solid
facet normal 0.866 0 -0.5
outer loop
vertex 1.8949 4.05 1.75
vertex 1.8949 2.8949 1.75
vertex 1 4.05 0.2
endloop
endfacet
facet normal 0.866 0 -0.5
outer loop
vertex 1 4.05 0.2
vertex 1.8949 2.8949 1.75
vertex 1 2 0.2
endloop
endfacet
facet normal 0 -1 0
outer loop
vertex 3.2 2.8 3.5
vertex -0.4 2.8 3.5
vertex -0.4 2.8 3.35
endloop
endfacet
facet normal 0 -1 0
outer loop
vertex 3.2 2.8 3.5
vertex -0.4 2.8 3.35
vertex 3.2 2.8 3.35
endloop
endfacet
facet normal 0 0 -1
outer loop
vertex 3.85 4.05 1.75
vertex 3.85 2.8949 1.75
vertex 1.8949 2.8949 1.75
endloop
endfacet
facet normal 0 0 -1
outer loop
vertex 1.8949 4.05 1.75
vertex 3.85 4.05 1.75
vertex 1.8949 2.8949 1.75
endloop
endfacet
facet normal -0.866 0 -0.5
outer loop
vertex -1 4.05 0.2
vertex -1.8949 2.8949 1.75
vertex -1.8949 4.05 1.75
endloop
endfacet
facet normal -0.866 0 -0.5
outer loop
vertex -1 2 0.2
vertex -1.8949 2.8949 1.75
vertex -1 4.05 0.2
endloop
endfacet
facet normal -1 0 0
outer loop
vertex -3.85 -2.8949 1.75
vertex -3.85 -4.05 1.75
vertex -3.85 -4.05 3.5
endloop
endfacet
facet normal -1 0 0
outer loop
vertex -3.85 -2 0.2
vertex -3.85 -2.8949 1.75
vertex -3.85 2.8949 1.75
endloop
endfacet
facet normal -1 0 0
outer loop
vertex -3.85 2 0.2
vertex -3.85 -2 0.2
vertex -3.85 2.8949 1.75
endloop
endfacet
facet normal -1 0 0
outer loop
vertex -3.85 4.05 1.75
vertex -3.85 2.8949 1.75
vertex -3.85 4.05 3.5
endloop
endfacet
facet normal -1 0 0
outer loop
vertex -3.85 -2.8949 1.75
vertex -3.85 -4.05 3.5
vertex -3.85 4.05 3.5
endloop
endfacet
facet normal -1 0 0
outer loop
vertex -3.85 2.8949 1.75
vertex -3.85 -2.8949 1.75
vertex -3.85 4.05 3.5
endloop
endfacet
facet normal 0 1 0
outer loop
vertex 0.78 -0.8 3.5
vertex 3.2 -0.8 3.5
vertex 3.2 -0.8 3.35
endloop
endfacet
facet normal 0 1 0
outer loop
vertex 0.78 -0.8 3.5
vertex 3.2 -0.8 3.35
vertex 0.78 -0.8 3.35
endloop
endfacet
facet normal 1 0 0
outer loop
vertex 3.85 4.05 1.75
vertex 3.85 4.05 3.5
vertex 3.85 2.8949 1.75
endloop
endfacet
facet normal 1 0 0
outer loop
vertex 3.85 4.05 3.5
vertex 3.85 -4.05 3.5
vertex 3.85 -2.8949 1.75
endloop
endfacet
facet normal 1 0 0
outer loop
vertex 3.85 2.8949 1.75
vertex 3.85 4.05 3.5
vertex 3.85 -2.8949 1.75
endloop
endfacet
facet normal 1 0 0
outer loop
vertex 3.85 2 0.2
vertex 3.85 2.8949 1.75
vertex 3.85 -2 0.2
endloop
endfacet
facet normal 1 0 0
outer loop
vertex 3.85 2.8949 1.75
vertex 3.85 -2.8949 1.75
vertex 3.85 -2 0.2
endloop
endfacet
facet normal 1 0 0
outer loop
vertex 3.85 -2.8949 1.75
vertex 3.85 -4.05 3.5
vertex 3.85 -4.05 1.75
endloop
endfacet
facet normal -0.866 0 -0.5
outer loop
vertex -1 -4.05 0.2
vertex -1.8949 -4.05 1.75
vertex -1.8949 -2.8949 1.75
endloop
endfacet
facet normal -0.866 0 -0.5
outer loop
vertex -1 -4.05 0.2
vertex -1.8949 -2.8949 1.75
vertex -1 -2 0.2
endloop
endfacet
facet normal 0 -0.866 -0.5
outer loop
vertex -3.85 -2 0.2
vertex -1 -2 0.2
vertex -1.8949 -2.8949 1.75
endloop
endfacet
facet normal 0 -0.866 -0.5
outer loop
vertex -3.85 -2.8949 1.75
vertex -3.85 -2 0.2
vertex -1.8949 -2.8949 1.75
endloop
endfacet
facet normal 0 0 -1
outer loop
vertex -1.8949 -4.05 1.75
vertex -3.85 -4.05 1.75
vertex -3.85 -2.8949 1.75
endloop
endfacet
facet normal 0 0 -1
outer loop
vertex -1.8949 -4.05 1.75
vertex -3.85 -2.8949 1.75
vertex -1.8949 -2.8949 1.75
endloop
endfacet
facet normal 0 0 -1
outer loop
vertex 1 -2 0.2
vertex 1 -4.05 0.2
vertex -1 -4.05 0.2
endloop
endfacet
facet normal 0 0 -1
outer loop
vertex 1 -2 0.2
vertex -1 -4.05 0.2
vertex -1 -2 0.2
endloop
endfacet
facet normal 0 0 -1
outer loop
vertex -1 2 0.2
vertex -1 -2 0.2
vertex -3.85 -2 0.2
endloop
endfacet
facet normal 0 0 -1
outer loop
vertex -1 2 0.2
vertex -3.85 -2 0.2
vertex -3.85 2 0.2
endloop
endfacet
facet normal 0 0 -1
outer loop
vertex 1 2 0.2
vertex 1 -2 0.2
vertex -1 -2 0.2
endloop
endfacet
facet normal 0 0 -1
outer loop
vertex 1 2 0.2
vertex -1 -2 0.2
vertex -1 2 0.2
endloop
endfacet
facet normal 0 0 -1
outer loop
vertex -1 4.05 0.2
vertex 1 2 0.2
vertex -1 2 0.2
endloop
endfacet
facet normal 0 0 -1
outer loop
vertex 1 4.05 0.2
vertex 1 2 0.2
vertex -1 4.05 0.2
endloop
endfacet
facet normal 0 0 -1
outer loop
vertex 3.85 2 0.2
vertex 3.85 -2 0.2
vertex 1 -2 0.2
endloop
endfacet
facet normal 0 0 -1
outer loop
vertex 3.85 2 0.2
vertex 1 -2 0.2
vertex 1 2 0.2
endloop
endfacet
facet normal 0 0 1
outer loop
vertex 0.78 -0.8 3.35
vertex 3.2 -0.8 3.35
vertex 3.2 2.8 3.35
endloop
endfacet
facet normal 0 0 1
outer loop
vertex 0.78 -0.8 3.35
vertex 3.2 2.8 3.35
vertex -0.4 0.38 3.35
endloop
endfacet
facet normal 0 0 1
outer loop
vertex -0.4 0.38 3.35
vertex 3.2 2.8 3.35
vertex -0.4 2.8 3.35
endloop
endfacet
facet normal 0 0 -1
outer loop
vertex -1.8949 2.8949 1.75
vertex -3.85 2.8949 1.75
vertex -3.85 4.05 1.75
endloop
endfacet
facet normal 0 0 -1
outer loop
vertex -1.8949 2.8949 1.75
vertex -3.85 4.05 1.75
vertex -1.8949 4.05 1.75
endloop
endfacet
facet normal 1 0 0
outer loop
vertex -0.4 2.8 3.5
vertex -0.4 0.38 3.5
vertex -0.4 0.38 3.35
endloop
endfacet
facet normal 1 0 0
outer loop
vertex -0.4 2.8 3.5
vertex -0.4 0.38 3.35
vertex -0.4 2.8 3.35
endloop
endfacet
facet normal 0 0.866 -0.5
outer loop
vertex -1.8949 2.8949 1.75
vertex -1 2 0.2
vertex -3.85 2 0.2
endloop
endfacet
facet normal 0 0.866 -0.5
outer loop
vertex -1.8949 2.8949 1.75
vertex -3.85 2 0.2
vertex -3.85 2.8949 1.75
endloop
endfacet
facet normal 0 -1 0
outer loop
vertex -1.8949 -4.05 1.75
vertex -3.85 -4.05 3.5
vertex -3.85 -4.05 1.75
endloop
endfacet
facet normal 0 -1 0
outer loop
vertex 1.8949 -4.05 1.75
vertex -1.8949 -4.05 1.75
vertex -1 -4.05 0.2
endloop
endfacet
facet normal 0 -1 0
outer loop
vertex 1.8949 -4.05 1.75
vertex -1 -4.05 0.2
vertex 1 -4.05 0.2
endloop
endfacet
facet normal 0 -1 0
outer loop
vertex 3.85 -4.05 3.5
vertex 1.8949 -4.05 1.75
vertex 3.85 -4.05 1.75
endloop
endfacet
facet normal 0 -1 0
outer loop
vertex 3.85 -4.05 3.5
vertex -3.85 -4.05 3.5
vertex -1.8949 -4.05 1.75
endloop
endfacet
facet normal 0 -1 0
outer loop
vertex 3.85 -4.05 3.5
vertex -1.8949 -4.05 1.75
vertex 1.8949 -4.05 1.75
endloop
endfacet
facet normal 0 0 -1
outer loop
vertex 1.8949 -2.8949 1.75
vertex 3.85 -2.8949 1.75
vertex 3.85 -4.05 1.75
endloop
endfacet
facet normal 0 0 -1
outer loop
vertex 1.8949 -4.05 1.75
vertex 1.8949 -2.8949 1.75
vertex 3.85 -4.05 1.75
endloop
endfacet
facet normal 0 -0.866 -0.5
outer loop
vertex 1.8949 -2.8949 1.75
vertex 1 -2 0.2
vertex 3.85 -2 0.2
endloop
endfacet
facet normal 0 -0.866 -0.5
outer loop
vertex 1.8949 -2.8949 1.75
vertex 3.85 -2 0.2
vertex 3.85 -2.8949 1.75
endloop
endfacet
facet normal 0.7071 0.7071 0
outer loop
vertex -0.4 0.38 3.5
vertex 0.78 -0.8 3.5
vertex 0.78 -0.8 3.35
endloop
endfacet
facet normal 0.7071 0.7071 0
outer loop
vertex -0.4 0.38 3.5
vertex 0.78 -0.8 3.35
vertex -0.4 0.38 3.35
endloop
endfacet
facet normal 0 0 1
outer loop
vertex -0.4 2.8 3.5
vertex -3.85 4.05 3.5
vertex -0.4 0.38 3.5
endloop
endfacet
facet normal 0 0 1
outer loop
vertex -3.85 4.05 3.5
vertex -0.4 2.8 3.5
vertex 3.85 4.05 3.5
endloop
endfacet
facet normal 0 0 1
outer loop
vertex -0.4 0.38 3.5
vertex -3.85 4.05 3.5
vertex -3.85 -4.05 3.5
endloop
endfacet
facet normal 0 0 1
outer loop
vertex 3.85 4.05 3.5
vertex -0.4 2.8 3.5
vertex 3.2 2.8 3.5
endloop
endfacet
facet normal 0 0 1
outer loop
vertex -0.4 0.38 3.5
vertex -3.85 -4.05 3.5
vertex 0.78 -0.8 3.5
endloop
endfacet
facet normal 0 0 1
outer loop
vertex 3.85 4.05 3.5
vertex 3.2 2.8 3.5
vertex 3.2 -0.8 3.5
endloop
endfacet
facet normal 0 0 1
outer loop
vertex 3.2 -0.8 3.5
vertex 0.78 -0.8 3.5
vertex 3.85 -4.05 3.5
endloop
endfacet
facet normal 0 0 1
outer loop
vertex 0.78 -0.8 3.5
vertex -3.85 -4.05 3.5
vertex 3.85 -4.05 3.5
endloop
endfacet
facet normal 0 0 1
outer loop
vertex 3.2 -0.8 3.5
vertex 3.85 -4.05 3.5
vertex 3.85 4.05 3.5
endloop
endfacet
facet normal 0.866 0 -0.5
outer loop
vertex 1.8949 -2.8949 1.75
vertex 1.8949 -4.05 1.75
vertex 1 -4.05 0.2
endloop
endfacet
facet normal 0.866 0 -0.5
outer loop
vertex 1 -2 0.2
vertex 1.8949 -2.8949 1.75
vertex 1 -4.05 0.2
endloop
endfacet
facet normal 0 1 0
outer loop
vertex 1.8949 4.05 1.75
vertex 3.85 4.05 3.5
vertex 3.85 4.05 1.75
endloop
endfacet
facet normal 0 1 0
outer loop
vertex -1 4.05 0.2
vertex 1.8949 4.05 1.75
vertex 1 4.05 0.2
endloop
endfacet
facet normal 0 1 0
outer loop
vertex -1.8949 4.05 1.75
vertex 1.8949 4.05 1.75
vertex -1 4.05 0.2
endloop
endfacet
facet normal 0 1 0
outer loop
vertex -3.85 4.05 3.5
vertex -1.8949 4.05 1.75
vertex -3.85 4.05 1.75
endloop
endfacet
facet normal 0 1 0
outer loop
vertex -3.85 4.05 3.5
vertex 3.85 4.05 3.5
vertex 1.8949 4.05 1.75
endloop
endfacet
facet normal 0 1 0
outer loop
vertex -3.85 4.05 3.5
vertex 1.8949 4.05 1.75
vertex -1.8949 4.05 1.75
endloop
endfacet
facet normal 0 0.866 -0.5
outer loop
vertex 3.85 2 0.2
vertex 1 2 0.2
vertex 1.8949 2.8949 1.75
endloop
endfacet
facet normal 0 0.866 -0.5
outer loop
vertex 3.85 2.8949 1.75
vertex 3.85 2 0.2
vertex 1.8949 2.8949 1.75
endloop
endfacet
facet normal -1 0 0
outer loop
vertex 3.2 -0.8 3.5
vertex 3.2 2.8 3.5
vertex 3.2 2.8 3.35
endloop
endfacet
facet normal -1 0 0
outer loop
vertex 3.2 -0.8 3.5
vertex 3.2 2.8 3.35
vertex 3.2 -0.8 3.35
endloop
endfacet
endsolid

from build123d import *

# Parameters (mm, degrees)
PAD_DEPTH    = 4.05
PAD001_DEPTH = 3.85
PAD002_DEPTH = 4.05
PAD003_DEPTH = 3.85
POCKET_DEPTH = 0.15


with BuildPart() as part:
    # MirroredSketch001 → Pad (new body, symmetric)
    with BuildSketch(Plane.XZ):
        Polygon((0, 0.2), (0, 3.5), (-3.85, 3.5), (-3.85, 1.75), (-1.894893, 1.75), (-1, 0.2), align=None)
    extrude(amount=PAD_DEPTH, both=True)

    # MirroredSketch → Pad001 (join, symmetric)
    with BuildSketch(Plane.YZ):
        Polygon((-2, 0.2), (-2.894893, 1.75), (-4.05, 1.75), (-4.05, 3.5), (0, 3.5), (0, 0.2), align=None)
    extrude(amount=PAD001_DEPTH, both=True)

    # Sketch001 → Pad002 (join, symmetric)
    with BuildSketch(Plane.XZ):
        Polygon((0, 0.2), (0, 3.5), (3.85, 3.5), (3.85, 1.75), (1.894893, 1.75), (1, 0.2), align=None)
    extrude(amount=PAD002_DEPTH, both=True)

    # Sketch → Pad003 (join, symmetric)
    with BuildSketch(Plane.YZ):
        Polygon((2, 0.2), (2.894893, 1.75), (4.05, 1.75), (4.05, 3.5), (0, 3.5), (0, 0.2), align=None)
    extrude(amount=PAD003_DEPTH, both=True)

    # Sketch002 (on Face20 of Pad003) → Pocket (cut)
    with BuildSketch(Plane.XY.offset(3.5)):
        Polygon((-0.4, 2.8), (3.2, 2.8), (3.2, -0.8), (0.78, -0.8), (-0.4, 0.38), align=None)
    extrude(amount=-POCKET_DEPTH, mode=Mode.SUBTRACT)


solid = part.part
